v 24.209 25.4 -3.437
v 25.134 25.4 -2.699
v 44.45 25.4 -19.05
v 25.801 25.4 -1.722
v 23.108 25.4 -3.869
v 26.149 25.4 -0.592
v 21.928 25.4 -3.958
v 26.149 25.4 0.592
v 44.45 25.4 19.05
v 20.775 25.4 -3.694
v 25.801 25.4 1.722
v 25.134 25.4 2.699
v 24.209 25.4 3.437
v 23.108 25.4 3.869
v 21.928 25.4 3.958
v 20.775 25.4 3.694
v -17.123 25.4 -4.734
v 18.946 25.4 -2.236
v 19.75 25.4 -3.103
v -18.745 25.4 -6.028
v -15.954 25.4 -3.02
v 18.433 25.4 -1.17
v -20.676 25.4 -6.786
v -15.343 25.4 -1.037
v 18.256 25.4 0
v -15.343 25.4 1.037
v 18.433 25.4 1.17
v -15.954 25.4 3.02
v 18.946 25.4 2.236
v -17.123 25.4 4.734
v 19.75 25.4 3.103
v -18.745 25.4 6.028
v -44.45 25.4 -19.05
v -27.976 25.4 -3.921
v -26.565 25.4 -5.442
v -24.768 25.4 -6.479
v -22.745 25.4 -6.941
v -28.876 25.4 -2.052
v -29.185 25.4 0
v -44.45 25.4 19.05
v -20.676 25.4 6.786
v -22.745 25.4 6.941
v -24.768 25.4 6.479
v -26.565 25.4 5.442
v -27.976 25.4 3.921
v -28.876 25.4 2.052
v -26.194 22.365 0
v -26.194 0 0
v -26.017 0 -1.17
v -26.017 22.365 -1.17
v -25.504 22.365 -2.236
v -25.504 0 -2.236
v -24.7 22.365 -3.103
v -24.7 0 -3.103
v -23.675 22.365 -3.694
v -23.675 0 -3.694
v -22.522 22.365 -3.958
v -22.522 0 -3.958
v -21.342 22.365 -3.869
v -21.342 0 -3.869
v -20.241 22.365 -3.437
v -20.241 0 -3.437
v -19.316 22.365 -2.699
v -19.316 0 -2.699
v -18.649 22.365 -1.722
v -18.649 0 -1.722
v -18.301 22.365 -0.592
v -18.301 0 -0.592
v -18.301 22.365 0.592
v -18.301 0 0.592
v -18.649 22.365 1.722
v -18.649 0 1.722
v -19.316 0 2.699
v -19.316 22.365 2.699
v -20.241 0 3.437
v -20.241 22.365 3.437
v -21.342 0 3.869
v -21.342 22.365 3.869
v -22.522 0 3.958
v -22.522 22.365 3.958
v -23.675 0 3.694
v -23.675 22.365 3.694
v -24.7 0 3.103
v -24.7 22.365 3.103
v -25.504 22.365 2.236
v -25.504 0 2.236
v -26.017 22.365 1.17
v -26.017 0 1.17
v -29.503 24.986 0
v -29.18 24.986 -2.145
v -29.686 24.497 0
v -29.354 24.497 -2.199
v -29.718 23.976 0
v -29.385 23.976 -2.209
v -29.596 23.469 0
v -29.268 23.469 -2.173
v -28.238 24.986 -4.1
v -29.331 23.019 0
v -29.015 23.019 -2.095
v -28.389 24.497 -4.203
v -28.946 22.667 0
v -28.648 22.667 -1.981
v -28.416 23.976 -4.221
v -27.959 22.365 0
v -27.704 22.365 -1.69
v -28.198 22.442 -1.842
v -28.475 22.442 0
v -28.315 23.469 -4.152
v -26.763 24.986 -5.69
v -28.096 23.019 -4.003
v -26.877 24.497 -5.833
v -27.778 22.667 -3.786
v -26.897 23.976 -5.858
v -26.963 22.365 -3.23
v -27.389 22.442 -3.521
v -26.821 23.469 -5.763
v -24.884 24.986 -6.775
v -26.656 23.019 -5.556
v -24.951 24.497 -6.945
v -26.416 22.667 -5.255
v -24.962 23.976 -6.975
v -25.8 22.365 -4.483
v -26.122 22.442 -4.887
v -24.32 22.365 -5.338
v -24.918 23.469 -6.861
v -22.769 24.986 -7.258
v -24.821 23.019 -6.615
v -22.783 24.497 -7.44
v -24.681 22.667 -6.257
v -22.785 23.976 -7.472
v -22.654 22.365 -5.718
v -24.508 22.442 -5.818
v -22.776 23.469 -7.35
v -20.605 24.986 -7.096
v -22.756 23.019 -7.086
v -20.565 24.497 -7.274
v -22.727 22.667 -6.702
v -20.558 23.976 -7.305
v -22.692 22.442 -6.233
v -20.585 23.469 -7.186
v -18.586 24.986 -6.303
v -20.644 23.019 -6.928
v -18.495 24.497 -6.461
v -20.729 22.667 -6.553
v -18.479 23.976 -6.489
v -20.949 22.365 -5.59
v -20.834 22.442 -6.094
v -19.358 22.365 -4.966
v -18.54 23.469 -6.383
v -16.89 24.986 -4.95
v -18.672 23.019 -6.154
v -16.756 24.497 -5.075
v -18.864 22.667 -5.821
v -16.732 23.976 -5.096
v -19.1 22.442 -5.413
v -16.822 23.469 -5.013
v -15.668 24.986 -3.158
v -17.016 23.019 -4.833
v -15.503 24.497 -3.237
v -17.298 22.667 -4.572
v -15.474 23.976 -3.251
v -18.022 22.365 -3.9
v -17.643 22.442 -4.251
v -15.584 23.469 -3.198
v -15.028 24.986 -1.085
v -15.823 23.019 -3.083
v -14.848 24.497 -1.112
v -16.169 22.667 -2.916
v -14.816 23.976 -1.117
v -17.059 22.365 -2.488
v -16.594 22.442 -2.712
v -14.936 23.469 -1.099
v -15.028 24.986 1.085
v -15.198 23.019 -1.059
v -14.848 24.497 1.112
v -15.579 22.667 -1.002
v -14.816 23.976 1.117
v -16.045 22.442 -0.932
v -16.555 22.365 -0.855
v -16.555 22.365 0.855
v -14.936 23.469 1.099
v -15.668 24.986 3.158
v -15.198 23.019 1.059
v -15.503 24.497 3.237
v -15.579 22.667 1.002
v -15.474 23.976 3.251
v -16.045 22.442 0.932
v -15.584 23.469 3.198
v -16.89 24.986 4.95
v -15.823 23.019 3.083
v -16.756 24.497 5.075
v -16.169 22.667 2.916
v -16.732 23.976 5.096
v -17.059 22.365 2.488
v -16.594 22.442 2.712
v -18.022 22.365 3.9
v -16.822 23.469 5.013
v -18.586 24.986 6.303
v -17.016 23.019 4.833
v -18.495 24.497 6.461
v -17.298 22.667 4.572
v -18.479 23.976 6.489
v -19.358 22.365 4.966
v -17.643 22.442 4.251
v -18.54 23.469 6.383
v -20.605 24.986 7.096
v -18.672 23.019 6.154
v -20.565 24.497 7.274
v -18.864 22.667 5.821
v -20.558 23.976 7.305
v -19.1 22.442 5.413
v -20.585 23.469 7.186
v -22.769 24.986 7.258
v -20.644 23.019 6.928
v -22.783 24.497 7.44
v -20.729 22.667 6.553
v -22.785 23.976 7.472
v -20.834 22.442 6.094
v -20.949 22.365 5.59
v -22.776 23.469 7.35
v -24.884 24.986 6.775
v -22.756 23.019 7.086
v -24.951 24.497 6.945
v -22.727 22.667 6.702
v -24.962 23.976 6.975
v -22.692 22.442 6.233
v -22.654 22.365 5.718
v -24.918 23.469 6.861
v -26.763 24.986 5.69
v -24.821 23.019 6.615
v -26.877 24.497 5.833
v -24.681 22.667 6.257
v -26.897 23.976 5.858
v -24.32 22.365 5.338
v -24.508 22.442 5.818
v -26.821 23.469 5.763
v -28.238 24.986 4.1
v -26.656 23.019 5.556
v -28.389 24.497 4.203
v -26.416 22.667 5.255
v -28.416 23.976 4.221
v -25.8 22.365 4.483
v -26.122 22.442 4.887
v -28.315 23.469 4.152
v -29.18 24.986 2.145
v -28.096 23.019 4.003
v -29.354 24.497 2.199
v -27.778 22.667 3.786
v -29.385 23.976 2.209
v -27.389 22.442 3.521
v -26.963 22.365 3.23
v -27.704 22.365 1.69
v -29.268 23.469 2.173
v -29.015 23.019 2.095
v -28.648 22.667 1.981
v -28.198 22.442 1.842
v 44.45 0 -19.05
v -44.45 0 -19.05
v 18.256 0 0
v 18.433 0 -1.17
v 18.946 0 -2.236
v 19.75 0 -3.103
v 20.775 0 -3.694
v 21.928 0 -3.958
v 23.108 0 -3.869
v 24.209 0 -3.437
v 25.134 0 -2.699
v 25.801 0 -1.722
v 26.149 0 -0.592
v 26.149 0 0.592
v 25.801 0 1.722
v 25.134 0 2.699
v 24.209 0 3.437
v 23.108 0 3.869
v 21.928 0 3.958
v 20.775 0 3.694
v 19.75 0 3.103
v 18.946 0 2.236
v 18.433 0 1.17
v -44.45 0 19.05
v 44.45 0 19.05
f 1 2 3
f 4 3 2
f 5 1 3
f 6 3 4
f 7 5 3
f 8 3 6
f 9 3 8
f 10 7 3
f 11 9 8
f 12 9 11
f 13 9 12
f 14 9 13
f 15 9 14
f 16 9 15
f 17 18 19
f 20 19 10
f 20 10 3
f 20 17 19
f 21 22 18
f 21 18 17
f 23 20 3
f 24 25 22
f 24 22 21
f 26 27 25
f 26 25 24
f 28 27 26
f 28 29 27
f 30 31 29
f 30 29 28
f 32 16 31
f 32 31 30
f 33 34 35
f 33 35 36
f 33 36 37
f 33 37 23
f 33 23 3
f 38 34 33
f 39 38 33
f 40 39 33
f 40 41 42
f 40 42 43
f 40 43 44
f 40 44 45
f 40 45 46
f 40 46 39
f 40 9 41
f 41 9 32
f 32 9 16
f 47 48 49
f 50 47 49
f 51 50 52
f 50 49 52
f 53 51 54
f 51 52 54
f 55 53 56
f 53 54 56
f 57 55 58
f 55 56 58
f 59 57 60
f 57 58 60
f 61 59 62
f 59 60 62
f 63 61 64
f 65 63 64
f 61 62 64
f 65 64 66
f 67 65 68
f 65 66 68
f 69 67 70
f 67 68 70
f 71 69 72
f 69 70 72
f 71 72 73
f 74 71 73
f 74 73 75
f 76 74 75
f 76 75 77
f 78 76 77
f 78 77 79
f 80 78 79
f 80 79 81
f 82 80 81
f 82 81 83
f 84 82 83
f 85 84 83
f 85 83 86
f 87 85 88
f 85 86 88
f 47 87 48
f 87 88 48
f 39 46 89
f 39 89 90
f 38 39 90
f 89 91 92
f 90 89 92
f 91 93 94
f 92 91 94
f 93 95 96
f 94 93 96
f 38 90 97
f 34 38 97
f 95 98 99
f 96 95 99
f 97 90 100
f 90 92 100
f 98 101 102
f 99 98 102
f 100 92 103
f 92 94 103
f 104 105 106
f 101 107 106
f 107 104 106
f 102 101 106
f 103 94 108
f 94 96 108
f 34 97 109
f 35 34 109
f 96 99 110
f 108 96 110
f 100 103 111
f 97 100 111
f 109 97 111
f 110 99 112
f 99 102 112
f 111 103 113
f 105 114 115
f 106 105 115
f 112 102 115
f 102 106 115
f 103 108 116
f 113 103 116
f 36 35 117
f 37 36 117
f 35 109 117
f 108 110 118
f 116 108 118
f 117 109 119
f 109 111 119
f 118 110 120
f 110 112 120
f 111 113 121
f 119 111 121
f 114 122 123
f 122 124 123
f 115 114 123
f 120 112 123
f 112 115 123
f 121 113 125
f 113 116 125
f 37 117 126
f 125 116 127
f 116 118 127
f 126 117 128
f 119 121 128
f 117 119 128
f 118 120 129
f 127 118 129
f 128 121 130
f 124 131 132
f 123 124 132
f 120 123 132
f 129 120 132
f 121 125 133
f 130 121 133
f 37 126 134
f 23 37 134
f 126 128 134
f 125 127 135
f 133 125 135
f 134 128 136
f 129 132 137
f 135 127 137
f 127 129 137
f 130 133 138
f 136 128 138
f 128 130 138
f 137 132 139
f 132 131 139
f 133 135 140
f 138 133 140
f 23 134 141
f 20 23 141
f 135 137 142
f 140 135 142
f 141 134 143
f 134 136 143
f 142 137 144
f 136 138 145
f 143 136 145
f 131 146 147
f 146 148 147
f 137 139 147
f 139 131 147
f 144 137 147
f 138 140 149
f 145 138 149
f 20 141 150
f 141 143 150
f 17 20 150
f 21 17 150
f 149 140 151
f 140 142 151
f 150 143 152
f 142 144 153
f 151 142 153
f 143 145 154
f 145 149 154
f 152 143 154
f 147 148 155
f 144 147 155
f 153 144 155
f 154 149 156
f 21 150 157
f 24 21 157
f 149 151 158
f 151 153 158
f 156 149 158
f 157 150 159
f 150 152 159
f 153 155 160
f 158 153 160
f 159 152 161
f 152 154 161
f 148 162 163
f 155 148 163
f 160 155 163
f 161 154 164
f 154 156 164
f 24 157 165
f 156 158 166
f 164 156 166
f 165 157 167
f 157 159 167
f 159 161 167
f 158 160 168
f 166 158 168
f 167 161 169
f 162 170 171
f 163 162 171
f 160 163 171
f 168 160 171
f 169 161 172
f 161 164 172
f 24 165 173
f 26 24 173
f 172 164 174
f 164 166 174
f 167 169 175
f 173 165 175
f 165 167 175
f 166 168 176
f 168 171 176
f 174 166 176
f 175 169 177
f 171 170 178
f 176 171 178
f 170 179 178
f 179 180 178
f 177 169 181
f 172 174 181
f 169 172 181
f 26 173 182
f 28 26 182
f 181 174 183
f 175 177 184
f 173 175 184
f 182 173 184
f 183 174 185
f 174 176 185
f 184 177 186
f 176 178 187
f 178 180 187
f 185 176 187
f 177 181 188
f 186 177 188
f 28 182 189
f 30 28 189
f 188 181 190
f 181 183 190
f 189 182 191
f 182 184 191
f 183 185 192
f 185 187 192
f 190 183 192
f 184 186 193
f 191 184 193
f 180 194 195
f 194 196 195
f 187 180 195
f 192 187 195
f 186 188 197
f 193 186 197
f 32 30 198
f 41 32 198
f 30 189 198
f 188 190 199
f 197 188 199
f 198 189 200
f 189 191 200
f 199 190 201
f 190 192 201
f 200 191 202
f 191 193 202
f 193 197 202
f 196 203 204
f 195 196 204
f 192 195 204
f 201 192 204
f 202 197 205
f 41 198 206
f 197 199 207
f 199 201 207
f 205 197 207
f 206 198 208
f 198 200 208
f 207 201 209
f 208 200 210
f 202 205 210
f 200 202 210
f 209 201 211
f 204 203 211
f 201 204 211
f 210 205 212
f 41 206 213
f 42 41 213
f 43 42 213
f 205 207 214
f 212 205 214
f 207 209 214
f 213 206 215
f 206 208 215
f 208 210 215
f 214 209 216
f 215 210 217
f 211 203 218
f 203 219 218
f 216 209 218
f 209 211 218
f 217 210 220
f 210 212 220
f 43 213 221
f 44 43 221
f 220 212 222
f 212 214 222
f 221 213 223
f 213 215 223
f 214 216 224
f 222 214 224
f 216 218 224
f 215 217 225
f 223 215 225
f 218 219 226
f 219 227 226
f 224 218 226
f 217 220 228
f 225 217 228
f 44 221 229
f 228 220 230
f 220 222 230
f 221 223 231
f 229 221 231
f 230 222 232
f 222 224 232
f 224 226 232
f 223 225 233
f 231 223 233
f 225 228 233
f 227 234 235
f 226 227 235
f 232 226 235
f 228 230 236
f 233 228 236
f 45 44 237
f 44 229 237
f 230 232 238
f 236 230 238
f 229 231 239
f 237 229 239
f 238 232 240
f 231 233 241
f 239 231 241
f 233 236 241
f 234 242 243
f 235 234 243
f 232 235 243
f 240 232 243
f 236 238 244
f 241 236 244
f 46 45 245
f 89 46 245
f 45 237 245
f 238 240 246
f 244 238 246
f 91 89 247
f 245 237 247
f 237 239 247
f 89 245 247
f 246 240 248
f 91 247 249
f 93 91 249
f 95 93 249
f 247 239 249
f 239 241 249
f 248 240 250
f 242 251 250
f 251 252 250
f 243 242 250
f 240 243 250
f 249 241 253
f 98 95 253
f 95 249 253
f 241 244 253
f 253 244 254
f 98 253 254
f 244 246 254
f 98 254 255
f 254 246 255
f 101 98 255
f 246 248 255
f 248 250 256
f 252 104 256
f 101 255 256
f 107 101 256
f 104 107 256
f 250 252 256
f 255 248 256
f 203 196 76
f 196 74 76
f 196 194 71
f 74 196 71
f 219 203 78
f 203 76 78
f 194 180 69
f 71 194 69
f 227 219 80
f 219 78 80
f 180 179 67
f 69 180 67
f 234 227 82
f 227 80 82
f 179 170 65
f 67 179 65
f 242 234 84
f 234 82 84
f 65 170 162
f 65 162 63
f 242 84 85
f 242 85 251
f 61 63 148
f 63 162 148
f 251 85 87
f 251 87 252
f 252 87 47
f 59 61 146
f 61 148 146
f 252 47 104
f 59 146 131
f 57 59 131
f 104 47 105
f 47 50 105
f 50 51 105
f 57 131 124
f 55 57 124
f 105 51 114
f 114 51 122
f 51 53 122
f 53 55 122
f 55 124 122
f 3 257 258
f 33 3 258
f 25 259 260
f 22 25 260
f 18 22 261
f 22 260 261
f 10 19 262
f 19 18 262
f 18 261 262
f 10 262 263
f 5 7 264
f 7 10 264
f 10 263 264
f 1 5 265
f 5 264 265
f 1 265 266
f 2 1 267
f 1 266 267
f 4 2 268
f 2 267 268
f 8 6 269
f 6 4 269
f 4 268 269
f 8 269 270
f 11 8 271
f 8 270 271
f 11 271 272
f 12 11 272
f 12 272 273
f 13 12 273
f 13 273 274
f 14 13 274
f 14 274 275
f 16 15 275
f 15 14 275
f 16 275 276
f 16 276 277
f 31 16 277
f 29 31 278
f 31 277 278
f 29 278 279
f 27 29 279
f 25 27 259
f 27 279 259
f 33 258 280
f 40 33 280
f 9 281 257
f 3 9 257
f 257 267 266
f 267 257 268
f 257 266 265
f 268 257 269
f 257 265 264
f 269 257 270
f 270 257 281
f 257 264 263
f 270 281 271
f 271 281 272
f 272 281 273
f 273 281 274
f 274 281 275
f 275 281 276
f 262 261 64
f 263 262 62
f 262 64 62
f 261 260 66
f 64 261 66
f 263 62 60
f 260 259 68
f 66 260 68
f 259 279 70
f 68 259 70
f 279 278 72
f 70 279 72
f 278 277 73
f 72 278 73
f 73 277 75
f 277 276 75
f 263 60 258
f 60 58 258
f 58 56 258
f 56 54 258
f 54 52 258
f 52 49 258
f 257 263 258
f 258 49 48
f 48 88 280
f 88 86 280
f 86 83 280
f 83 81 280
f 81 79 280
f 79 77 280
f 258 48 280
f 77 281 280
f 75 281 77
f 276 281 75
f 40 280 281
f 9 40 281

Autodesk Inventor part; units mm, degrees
ref_plane "YZ Plane" through (0, 0, 0) normal (1, 0, 0) x (0, 1, 0)
ref_plane "XZ Plane" through (0, 0, 0) normal (0, 1, 0) x (-1, 0, 0)
ref_plane "XY Plane" through (0, 0, 0) normal (0, 0, 1) x (1, 0, 0)
sketch "Sketch1" plane through (0, 0, 0) normal (0, 1, 0) x (-1, 0, 0)
  line L0 (-44.45, -19.05) -> (44.45, -19.05)
  line L1 (44.45, -19.05) -> (44.45, 19.05)
  line L2 (44.45, 19.05) -> (-44.45, 19.05)
  line L3 (-44.45, 19.05) -> (-44.45, -19.05)
  line L4 (-44.45, -19.05) -> (44.45, 19.05) construction
  line L5 (44.45, -19.05) -> (-44.45, 19.05) construction
  circle A0 centre (22.225, 0) radius 3.9688
  circle A1 centre (-22.225, 0) radius 3.9688
  circle A2 centre (22.225, 0) radius 12.7
  circle A3 centre (-22.225, 0) radius 12.7
  point P0 (0, 0)
  point P1 (0, 0)
  point P2 (0, 0)
  dimension "d3" = 38.1
  dimension "d4" = 88.9
  dimension "d20" = 7.9375
  dimension "d21" = 25.4
  dimension "d22" = 22.225
  dimension "d23" = 22.225
extrude "Extrusion5" add sketch "Sketch1" along normal blind 25.4 contours L3 L2 L1 L0 | A2 | A3
sketch "Sketch8" plane through (0, 0, 0) normal (0, 0, 1) x (1, 0, 0)
  line L0 (44.45, 25.4) -> (-44.45, 25.4) projected
  circle A0 centre (-27.9591, 24.13) radius 1.7653
  line L1 (-26.1938, 25.4) -> (-18.2563, 25.4) projected
  line L2 (-18.2563, 0) -> (-26.1938, 0) projected
  line L3 (-26.1938, 0) -> (-26.1938, 25.4) projected
  line L4 (-18.2563, 0) -> (-18.2563, 25.4) projected
  line L5 (-22.225, 25.4) -> (-22.225, 0) construction
  line L6 (-44.45, 25.4) -> (-44.45, 27.8765) construction
  line L7 (-27.9591, 22.3647) -> (-22.225, 22.3647)
  line L8 (-26.7329, 25.4) -> (-22.225, 25.4) construction
  line L9 (-22.225, 22.3647) -> (-22.225, 25.4)
  line L10 (-22.225, 25.4) -> (-26.7329, 25.4)
  point P0 (0, 0)
  dimension "d34" = 3.5306
  dimension "d35" = 1.27
revolve "Revolution1" cut sketch "Sketch8" angle 360 about axis through (-22.225, 25.4, 0) along (0, -1, 0) contours L9 L7 L3 L0 | L3 A0 L0 | A0 L0 | L0 A0 | L3 L7 A0
sketch "Sketch9" plane through (0, 25.4, 0) normal (0, 1, 0) x (1, 0, 0)
  circle A0 centre (-22.225, 0) radius 6.9602 projected
  circle A1 centre (22.225, 0) radius 3.9687 projected
  line L0 (44.45, 19.05) -> (-44.45, 19.05) projected
  line L1 (-44.45, 19.05) -> (-44.45, -19.05) projected
  line L2 (-44.45, -19.05) -> (44.45, -19.05) projected
  line L3 (44.45, -19.05) -> (44.45, 19.05) projected
  circle A2 centre (-22.225, 0) radius 4.8006
  point P0 (0, 0)
  dimension "d37" = 9.6012
equation "\"d23\" = d22"
properties part number "AirPressureAndValve"
